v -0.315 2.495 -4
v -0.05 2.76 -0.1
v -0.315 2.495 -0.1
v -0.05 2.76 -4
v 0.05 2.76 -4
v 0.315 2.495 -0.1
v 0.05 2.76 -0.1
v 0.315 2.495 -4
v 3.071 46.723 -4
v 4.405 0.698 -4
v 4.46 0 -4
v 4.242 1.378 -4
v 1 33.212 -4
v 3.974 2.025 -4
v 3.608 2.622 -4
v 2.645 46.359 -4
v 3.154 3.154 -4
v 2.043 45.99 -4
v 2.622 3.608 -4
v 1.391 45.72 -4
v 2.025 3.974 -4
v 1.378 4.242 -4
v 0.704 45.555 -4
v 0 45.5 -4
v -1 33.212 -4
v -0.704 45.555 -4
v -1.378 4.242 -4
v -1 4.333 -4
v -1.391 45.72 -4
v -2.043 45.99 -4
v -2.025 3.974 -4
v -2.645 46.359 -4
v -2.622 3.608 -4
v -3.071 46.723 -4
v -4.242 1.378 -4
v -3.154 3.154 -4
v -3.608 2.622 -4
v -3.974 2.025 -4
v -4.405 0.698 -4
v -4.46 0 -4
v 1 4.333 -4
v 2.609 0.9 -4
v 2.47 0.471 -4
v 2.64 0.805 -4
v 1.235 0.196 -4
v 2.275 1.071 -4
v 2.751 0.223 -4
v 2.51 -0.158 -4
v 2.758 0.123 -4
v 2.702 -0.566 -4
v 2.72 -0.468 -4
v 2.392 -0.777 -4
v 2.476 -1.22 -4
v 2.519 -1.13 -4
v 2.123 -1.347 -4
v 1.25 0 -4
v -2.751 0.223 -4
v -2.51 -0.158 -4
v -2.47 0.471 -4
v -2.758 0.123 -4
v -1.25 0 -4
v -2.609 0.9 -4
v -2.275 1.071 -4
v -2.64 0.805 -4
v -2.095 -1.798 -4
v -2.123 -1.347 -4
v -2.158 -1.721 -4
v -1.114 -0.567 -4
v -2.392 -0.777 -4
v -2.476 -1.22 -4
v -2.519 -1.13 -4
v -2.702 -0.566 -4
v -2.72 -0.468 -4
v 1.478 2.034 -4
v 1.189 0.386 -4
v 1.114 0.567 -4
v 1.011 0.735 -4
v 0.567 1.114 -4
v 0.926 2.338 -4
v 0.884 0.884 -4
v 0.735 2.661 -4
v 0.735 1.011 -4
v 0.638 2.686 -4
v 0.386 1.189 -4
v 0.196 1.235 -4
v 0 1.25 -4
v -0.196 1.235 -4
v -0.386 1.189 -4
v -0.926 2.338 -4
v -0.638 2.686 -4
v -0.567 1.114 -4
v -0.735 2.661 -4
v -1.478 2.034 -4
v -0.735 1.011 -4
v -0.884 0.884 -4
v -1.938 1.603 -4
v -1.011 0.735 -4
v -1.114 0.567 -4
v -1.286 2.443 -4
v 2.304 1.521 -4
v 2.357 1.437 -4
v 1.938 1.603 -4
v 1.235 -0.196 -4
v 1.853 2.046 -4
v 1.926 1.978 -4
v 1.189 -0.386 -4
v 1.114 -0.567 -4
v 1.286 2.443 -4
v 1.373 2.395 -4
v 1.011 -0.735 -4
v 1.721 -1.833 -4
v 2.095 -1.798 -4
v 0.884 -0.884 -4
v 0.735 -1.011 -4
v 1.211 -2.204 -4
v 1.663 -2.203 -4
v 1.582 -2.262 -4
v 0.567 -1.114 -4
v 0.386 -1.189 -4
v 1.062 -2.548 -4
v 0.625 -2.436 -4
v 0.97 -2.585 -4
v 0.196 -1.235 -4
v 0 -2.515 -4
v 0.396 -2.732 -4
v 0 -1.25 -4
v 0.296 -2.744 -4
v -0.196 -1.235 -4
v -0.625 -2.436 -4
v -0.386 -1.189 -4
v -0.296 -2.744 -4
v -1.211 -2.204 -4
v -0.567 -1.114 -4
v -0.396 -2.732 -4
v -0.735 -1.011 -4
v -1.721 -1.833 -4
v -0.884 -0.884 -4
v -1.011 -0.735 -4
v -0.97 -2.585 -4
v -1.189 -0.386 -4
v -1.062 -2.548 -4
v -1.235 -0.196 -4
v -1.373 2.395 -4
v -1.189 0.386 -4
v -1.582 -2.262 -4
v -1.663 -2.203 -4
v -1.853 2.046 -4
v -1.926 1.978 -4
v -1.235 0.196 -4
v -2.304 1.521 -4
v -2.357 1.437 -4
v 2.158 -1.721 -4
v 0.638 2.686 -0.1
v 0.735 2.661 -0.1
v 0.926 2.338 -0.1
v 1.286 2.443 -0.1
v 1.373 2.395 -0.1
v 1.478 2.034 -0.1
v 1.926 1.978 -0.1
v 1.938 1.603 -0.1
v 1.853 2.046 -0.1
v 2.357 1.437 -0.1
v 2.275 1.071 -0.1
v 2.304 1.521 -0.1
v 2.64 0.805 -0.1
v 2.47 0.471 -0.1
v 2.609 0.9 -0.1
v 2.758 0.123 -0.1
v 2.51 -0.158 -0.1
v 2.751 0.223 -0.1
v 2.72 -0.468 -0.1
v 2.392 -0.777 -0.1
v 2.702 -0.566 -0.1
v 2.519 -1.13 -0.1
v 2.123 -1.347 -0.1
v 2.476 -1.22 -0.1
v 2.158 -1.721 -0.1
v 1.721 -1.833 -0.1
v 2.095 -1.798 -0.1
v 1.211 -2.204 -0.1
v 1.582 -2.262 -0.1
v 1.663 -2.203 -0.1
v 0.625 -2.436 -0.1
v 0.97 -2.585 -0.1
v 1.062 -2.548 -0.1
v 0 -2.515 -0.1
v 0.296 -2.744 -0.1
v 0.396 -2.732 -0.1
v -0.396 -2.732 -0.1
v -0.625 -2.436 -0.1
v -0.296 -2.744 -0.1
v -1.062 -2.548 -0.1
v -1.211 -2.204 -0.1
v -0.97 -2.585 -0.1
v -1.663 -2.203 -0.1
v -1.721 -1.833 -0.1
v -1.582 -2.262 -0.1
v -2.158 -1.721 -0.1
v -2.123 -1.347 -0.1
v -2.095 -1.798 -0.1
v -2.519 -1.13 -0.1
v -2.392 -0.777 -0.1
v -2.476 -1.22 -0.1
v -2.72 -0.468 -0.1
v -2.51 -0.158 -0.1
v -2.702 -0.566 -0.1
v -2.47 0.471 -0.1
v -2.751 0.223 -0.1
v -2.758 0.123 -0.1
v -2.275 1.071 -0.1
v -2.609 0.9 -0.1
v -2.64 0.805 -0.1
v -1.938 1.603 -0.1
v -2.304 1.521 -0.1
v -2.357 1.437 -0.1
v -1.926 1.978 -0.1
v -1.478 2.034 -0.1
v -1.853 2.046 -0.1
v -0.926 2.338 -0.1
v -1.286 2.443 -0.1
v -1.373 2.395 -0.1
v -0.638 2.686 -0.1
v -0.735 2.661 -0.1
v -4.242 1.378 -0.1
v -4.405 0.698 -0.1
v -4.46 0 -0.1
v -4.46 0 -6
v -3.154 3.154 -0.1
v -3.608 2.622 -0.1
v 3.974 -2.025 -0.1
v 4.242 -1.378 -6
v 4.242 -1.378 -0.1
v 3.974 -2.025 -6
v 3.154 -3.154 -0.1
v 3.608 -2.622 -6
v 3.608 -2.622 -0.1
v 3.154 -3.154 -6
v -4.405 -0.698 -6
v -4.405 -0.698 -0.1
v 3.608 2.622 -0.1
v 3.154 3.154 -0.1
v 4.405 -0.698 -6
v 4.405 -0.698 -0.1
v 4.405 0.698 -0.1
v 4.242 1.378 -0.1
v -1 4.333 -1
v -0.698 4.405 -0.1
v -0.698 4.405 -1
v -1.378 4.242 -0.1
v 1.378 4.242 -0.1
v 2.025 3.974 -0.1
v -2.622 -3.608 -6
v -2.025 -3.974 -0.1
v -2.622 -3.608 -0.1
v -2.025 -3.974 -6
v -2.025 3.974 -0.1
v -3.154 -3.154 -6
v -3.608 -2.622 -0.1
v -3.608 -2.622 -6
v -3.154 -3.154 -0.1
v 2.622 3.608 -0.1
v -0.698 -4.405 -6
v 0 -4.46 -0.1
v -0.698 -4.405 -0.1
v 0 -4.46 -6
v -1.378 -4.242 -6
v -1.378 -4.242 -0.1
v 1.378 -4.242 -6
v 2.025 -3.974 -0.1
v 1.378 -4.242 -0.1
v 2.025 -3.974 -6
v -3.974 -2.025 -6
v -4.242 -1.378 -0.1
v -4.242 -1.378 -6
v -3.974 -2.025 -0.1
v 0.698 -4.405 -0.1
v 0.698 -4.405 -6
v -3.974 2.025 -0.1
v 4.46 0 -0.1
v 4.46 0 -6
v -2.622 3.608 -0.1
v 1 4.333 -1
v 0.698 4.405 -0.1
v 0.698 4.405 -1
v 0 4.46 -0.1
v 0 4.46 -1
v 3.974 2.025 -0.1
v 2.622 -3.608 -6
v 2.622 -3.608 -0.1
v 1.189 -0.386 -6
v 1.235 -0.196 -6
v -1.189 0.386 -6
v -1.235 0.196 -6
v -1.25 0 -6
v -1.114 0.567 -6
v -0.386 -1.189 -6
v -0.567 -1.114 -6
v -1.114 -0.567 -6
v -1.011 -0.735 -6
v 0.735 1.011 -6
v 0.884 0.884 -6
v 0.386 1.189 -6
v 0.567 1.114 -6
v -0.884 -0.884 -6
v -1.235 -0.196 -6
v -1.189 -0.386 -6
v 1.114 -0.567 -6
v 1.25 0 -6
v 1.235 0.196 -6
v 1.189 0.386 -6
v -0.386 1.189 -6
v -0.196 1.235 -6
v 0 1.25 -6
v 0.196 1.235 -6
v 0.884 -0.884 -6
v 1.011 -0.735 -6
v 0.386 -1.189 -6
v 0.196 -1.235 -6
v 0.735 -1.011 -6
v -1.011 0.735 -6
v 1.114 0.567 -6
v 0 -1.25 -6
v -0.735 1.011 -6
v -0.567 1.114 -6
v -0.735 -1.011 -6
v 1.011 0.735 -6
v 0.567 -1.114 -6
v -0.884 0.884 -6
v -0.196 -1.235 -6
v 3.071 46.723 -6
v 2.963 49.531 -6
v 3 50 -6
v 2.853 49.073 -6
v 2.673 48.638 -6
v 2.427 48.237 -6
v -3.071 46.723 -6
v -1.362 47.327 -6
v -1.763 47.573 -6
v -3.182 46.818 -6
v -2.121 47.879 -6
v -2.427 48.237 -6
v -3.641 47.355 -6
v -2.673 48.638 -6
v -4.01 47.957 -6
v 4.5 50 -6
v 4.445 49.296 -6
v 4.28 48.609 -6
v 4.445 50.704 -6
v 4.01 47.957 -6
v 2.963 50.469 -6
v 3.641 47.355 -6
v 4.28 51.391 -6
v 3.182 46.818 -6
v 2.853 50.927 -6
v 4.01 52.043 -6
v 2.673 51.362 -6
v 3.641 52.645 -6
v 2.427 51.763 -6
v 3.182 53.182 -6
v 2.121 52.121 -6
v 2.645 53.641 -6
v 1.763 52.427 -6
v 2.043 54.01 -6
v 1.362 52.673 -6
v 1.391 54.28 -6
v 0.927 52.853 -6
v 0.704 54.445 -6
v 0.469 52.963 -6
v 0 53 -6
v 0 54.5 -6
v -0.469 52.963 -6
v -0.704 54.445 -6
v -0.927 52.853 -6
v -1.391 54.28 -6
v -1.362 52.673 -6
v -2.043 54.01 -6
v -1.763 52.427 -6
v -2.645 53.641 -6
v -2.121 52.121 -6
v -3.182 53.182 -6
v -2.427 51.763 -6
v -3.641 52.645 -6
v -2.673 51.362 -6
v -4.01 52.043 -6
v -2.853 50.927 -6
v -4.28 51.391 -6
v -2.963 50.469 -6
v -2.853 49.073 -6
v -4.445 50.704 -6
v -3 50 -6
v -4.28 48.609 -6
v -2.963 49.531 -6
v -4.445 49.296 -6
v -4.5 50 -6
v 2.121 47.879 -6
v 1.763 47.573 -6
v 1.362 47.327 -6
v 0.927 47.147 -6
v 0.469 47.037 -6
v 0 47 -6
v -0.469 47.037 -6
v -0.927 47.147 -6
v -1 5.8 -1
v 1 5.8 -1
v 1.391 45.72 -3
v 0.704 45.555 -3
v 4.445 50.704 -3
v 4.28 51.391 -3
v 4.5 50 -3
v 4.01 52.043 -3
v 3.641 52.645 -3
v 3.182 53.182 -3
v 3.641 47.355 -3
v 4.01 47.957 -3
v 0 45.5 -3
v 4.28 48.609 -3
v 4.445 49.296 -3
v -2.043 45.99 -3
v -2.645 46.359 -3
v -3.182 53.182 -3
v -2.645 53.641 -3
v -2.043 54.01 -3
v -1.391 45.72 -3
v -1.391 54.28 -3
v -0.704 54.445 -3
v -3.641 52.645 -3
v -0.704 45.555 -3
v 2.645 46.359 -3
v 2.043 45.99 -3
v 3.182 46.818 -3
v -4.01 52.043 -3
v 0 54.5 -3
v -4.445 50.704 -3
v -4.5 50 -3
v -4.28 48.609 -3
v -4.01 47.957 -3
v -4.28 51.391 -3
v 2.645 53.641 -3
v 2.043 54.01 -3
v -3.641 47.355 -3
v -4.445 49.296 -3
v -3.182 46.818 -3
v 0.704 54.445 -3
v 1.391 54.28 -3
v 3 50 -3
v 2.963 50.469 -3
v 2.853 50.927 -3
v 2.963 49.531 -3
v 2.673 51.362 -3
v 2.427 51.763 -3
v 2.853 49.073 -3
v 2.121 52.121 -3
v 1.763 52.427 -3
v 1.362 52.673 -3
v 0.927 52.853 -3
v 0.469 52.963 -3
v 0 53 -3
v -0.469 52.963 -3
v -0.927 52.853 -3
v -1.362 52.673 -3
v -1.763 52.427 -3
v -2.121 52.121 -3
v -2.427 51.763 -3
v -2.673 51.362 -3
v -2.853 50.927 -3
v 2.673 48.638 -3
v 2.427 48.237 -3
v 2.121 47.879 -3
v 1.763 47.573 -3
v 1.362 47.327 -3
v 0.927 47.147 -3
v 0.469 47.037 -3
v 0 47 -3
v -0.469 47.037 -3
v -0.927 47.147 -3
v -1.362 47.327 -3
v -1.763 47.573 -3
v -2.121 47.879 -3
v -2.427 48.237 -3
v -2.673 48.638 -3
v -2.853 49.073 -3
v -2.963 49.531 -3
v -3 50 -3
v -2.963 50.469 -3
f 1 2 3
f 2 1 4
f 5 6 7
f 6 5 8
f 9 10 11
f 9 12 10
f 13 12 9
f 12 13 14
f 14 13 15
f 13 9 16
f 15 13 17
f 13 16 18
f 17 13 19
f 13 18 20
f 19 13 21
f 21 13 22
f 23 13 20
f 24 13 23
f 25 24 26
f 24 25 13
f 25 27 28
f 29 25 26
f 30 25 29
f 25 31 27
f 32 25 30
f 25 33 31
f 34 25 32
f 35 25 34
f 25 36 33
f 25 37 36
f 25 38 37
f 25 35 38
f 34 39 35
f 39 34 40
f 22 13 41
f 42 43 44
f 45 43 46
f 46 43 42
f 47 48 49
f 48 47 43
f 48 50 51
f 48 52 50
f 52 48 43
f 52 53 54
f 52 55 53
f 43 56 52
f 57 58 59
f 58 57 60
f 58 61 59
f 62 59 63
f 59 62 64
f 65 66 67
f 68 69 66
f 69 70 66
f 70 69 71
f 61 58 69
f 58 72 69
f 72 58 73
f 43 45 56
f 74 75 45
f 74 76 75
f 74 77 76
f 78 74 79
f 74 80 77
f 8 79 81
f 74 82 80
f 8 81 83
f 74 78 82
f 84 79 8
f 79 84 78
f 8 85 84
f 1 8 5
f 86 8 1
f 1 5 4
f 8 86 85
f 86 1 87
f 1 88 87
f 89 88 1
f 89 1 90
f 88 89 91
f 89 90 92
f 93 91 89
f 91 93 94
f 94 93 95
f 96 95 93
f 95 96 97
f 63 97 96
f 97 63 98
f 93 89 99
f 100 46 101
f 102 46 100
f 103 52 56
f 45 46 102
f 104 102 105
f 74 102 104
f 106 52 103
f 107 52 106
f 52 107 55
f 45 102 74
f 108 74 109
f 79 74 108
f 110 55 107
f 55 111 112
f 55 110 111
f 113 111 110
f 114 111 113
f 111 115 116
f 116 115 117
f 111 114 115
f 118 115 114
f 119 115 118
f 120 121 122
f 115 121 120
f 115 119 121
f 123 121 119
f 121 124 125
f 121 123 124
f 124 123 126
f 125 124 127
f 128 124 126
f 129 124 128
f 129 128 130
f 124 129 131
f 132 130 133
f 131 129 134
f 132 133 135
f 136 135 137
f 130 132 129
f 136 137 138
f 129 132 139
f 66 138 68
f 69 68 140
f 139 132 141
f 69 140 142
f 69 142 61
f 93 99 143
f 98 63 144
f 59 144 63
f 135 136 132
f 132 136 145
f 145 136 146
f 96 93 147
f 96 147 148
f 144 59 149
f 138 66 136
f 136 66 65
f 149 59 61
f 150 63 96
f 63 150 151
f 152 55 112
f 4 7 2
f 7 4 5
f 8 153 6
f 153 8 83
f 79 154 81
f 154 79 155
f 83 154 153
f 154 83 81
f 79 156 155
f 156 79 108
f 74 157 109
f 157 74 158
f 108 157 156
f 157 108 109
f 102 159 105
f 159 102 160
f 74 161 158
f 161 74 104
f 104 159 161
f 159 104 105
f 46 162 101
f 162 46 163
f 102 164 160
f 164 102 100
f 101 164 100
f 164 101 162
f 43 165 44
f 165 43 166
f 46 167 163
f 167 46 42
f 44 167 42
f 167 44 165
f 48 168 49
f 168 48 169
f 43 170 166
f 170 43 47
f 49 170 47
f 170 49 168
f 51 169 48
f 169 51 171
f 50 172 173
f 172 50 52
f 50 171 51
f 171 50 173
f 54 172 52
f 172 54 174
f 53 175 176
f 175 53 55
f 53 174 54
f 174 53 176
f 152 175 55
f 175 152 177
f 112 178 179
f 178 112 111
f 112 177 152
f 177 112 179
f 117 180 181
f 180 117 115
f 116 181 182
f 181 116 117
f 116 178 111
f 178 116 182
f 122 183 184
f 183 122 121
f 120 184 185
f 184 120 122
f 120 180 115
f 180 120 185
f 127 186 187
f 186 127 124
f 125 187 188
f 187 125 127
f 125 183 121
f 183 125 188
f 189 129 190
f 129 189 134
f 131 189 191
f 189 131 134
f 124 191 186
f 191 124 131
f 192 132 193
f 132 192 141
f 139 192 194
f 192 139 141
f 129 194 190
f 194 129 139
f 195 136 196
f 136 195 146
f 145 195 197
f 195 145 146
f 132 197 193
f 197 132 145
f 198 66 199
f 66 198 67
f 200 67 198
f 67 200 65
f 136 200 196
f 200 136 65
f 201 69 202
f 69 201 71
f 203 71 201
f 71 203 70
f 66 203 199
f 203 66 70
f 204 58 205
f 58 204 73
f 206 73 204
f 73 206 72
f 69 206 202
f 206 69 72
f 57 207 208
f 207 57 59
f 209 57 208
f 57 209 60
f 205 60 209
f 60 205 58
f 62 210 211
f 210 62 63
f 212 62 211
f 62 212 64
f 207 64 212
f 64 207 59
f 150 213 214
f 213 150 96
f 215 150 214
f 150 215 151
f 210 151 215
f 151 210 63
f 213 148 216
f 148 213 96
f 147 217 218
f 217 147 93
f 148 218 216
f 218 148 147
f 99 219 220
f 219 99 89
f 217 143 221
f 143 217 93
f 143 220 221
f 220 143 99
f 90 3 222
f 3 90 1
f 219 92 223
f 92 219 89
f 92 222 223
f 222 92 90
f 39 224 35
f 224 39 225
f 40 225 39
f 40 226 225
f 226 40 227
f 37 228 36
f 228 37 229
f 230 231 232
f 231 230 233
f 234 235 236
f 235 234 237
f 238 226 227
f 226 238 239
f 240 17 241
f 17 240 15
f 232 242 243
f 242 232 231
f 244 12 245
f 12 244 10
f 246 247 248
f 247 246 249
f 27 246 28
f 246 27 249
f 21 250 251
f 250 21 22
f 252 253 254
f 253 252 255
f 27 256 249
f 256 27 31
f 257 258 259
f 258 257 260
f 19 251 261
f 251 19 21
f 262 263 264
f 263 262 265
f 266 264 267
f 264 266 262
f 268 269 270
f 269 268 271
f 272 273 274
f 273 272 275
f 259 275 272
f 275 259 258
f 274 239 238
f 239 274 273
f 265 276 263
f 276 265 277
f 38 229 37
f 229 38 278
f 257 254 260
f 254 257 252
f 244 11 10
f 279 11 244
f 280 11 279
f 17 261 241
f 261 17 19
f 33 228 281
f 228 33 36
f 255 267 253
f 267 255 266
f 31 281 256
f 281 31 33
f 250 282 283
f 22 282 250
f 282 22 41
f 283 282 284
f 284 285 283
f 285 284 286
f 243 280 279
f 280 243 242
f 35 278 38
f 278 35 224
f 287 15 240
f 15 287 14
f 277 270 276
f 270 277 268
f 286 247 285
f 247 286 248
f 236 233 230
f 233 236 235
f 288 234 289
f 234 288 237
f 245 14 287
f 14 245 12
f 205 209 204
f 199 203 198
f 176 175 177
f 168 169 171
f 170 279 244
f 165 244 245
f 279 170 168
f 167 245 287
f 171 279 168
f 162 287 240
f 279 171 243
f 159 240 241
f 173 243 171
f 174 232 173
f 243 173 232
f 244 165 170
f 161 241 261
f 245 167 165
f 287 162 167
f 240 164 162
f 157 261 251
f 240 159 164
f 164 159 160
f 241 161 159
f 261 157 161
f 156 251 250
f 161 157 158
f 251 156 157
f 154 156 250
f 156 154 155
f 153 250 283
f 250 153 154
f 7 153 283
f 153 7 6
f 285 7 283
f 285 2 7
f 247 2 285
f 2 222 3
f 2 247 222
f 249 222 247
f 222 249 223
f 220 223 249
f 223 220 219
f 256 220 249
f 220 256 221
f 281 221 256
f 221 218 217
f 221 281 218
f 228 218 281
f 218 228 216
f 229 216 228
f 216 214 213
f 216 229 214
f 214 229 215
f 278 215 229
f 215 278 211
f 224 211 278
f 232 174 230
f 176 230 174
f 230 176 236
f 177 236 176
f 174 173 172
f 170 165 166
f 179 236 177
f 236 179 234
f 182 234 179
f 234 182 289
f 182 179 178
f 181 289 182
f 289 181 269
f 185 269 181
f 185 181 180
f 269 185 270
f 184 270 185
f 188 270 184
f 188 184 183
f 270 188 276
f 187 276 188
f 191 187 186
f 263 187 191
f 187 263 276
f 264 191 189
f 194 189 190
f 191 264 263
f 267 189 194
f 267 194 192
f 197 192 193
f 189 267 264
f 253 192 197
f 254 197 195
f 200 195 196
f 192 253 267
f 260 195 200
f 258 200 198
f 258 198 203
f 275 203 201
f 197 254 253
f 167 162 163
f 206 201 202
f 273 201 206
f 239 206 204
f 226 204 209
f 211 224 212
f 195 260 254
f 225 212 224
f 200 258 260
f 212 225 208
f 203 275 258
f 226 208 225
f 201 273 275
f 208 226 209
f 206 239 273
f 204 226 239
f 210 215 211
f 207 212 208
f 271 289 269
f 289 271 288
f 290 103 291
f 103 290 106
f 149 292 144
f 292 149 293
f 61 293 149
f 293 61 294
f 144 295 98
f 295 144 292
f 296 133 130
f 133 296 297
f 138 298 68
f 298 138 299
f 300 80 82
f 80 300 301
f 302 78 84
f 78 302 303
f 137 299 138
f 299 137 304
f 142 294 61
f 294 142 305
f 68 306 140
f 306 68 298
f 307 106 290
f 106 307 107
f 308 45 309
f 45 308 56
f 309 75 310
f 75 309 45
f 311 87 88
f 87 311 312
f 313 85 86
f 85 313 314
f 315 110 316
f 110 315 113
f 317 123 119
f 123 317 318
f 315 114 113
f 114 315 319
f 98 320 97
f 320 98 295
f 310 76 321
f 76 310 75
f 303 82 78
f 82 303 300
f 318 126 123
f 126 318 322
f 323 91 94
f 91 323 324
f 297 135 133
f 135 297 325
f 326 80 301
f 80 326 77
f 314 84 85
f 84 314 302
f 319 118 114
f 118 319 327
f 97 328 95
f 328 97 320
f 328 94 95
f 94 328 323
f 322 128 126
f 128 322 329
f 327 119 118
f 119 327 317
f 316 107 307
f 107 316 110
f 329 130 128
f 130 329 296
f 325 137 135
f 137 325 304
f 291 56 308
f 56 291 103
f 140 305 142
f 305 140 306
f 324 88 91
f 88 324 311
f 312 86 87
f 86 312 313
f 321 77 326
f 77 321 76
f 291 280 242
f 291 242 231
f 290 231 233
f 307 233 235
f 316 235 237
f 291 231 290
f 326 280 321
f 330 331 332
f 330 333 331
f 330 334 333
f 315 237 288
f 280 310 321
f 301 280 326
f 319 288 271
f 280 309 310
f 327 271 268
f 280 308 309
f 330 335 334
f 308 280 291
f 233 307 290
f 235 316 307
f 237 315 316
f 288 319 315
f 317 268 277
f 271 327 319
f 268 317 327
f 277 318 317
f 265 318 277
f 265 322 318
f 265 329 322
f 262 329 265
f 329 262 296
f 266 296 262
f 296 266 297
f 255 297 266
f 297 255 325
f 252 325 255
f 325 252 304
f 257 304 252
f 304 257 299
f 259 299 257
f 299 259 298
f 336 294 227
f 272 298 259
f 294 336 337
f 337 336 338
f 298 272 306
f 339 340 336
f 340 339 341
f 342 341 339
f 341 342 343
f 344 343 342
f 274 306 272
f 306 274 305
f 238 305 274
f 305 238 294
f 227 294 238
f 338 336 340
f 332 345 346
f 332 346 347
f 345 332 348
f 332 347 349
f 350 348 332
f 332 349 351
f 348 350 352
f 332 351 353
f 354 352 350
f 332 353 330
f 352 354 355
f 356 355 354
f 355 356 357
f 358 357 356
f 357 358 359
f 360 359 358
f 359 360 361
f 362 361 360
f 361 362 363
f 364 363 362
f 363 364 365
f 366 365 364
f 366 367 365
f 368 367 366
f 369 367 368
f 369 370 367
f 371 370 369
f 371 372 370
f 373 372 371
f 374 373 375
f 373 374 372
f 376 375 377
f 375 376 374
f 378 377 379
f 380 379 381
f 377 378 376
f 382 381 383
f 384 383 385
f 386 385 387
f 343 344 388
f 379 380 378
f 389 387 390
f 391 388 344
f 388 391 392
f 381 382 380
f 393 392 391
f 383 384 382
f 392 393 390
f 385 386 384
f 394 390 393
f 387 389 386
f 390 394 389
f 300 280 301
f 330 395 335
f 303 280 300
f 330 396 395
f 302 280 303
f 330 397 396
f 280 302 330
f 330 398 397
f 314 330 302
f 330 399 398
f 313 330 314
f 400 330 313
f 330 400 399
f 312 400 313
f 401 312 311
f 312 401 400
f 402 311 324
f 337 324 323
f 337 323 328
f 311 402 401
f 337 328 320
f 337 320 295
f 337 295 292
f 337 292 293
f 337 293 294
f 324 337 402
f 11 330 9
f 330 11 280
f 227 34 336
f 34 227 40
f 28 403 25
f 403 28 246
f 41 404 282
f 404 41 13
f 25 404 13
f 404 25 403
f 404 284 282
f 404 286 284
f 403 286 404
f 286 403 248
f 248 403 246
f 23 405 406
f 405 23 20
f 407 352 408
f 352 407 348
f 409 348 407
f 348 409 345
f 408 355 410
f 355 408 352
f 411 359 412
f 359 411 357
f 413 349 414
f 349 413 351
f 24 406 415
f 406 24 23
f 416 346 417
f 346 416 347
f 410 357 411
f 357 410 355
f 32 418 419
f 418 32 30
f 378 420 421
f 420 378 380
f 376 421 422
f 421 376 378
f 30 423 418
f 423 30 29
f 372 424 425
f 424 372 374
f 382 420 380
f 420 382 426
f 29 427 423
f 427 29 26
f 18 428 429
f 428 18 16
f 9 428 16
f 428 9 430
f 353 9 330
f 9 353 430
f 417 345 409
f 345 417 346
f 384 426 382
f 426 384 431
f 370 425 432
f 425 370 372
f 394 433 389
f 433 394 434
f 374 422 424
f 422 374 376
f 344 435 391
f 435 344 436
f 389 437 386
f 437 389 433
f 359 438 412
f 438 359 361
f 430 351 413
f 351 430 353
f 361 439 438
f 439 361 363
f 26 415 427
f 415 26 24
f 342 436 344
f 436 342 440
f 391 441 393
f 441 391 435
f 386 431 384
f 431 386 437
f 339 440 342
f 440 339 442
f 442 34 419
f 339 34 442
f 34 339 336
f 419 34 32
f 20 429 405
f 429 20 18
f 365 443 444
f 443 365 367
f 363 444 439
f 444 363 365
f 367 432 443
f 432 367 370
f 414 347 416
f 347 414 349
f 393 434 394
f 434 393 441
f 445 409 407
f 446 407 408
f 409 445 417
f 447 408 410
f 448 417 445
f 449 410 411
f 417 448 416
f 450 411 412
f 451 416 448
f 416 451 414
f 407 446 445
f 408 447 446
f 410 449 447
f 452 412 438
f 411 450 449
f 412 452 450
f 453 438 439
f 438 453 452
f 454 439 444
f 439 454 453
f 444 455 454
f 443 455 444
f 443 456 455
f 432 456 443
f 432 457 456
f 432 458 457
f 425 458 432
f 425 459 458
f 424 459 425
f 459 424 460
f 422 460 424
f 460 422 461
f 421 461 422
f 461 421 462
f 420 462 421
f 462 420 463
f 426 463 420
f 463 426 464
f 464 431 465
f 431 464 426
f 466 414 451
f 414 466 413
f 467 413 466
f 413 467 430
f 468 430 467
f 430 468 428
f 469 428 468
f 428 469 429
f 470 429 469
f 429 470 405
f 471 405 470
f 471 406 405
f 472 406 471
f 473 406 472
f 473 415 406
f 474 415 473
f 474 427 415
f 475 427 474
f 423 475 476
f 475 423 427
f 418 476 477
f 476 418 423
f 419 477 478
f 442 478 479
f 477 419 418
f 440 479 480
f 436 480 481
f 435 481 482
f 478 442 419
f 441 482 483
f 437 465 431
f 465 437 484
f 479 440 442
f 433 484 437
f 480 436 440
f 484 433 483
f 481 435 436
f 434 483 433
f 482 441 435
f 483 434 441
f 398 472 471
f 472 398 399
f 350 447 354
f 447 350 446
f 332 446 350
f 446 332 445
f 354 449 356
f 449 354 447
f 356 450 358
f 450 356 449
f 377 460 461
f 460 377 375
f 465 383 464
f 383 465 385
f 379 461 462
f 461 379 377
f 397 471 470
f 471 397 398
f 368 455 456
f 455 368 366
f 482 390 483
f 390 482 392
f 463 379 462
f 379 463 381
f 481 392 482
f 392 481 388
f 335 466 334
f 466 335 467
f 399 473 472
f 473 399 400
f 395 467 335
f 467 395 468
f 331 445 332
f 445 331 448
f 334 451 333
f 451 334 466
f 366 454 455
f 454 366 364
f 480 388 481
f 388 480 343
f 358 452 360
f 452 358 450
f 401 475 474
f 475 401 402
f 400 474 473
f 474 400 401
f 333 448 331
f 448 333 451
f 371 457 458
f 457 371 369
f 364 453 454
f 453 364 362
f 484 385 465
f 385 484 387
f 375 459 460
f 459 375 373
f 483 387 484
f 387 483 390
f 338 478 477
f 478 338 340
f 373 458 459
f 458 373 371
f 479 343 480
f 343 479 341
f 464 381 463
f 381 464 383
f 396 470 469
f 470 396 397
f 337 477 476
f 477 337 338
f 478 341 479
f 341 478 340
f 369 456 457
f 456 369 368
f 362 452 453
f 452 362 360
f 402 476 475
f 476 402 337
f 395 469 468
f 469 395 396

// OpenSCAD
/**
 *  Parametric servo arm generator for OpenScad
 *  Générateur de palonnier de servo pour OpenScad
 *
 *  Copyright (c) 2012 Charles Rincheval.  All rights reserved.
 *
 *  This library is free software; you can redistribute it and/or
 *  modify it under the terms of the GNU Lesser General Public
 *  License as published by the Free Software Foundation; either
 *  version 2.1 of the License, or (at your option) any later version.
 *
 *  This library is distributed in the hope that it will be useful,
 *  but WITHOUT ANY WARRANTY; without even the implied warranty of
 *  MERCHANTABILITY or FITNESS FOR A PARTICULAR PURPOSE.  See the GNU
 *  Lesser General Public License for more details.
 *
 *  You should have received a copy of the GNU Lesser General Public
 *  License along with this library; if not, write to the Free Software
 *  Foundation, Inc., 51 Franklin St, Fifth Floor, Boston, MA  02110-1301  USA
 *
 *  Last update :
 *  https://github.com/hugokernel/OpenSCAD_ServoArms
 *
 *  http://www.digitalspirit.org/
 */

$fn = 40;

/**
 *  Clear between arm head and servo head
 *  With PLA material, use clear : 0.3, for ABS, use 0.2
 */
SERVO_HEAD_CLEAR = 0.3;

/**
 *  Head / Tooth parameters
 *  Futaba 3F Standard Spline
 *  http://www.servocity.com/html/futaba_servo_splines.html
 *
 *  First array (head related) :
 *  0. Head external diameter
 *  1. Head heigth
 *  2. Head thickness
 *  3. Head screw diameter
 *
 *  Second array (tooth related) :
 *  0. Tooth count
 *  1. Tooth height
 *  2. Tooth length
 *  3. Tooth width
 */
FUTABA_3F_SPLINE = [
    [4.92, 4, 2, 2.5],
    [25, 0.3, 0.7, 0.1]
];

module servo_futaba_3f(length, count) {
    servo_arm(FUTABA_3F_SPLINE, [length, count]);
}

/**
 *  If you want to support a new servo, juste add a new spline definition array
 *  and a module named like servo_XXX_YYY where XXX is servo brand and YYY is the
 *  connection type (3f) or the servo type (s3003)
 */

module servo_standard(length, count) {
    servo_futaba_3f(length, count);
}

/**
 *  Tooth
 *
 *    |<-w->|
 *    |_____|___
 *    /     \  ^h
 *  _/       \_v
 *   |<--l-->|
 *
 *  - tooth length (l)
 *  - tooth width (w)
 *  - tooth height (h)
 *  - height
 *
 */
module servo_head_tooth(length, width, height, head_height) {
    linear_extrude(height = head_height) {
        polygon([[-length / 2, 0], [-width / 2, height], [width / 2, height], [length / 2,0]]);
    }
}

/**
 *  Servo head
 */
module servo_head(params, clear = SERVO_HEAD_CLEAR) {

    head = params[0];
    tooth = params[1];

    head_diameter = head[0];
    head_heigth = head[1];

    tooth_count = tooth[0];
    tooth_height = tooth[1];
    tooth_length = tooth[2];
    tooth_width = tooth[3];

    % cylinder(r = head_diameter / 2, h = head_heigth + 1);

    cylinder(r = head_diameter / 2 - tooth_height + 0.03 + clear, h = head_heigth);

    for (i = [0 : tooth_count]) {
        rotate([0, 0, i * (360 / tooth_count)]) {
            translate([0, head_diameter / 2 - tooth_height + clear, 0]) {
                servo_head_tooth(tooth_length, tooth_width, tooth_height, head_heigth);
            }
        }
    }
}

/**
 *  Servo hold
 *  - Head / Tooth parameters
 *  - Arms params (length and count)
 */
module servo_arm(params, arms) {

    head = params[0];
    tooth = params[1];

    head_diameter = head[0];
    head_heigth = head[1];
    head_thickness = head[2];
    head_screw_diameter = head[3];

    tooth_length = tooth[2];
    tooth_width = tooth[3];

    arm_length = arms[0];
    arm_count = arms[1];

    /**
     *  Servo arm
     *  - length is from center to last hole
     */
    module arm(tooth_length, tooth_width, head_height, head_heigth, hole_count = 1) {

        arm_screw_diameter = 2;

        difference() {
            union() {
                cylinder(r = tooth_width / 2, h = head_heigth);

                linear_extrude(height = head_heigth) {
                    polygon([
                        [-tooth_width / 2, 0], [-tooth_width / 3, tooth_length],
                        [tooth_width / 3, tooth_length], [tooth_width / 2, 0]
                    ]);
                }

                translate([0, tooth_length, 0]) {
                    cylinder(r = tooth_width / 3, h = head_heigth);
                }

                if (tooth_length >= 12) {
                    translate([-head_heigth / 2 + 2, 3.8, -4]) {
                        rotate([90, 0, 0]) {
                            rotate([0, -90, 0]) {
                                linear_extrude(height = head_heigth) {
                                    polygon([
                                        [-tooth_length / 1.7, 4], [0, 4], [0, - head_height + 5],
                                        [-2, - head_height + 5]
                                    ]);
                                }
                            }
                        }
                    }
                }
            }

            // Hole
            for (i = [0 : hole_count - 1]) {
                //translate([0, length - (length / hole_count * i), -1]) {
                translate([0, tooth_length - (4 * i), -1]) {
                    cylinder(r = arm_screw_diameter / 2, h = 10);
                }
            }

            cylinder(r = head_screw_diameter / 2, h = 10);
        }
    }

    difference() {
        translate([0, 0, 0.1]) {
            cylinder(r = head_diameter / 2 + head_thickness, h = head_heigth + 1);
        }

        cylinder(r = head_screw_diameter / 2, h = 10);

        servo_head(params);
    }

    arm_thickness = head_thickness;

    // Arm
    translate([0, 0, head_heigth]) {
        for (i = [0 : arm_count - 1]) {
            rotate([0, 0, i * (360 / arm_count)]) {
                arm(arm_length, head_diameter + arm_thickness * 2, head_heigth, 2);
            }
        }
    }
}

module demo() {
    rotate([0, 180, 0])
        servo_standard(20, 4);
}

difference()
{
union()
{
    rotate([0, 180, 0])
        servo_standard(50, 1);
    translate([0,50,-6]) cylinder(h=3, r=4.5);
}
    translate([0,50,-6.1]) cylinder(h=4, r=3);
}
